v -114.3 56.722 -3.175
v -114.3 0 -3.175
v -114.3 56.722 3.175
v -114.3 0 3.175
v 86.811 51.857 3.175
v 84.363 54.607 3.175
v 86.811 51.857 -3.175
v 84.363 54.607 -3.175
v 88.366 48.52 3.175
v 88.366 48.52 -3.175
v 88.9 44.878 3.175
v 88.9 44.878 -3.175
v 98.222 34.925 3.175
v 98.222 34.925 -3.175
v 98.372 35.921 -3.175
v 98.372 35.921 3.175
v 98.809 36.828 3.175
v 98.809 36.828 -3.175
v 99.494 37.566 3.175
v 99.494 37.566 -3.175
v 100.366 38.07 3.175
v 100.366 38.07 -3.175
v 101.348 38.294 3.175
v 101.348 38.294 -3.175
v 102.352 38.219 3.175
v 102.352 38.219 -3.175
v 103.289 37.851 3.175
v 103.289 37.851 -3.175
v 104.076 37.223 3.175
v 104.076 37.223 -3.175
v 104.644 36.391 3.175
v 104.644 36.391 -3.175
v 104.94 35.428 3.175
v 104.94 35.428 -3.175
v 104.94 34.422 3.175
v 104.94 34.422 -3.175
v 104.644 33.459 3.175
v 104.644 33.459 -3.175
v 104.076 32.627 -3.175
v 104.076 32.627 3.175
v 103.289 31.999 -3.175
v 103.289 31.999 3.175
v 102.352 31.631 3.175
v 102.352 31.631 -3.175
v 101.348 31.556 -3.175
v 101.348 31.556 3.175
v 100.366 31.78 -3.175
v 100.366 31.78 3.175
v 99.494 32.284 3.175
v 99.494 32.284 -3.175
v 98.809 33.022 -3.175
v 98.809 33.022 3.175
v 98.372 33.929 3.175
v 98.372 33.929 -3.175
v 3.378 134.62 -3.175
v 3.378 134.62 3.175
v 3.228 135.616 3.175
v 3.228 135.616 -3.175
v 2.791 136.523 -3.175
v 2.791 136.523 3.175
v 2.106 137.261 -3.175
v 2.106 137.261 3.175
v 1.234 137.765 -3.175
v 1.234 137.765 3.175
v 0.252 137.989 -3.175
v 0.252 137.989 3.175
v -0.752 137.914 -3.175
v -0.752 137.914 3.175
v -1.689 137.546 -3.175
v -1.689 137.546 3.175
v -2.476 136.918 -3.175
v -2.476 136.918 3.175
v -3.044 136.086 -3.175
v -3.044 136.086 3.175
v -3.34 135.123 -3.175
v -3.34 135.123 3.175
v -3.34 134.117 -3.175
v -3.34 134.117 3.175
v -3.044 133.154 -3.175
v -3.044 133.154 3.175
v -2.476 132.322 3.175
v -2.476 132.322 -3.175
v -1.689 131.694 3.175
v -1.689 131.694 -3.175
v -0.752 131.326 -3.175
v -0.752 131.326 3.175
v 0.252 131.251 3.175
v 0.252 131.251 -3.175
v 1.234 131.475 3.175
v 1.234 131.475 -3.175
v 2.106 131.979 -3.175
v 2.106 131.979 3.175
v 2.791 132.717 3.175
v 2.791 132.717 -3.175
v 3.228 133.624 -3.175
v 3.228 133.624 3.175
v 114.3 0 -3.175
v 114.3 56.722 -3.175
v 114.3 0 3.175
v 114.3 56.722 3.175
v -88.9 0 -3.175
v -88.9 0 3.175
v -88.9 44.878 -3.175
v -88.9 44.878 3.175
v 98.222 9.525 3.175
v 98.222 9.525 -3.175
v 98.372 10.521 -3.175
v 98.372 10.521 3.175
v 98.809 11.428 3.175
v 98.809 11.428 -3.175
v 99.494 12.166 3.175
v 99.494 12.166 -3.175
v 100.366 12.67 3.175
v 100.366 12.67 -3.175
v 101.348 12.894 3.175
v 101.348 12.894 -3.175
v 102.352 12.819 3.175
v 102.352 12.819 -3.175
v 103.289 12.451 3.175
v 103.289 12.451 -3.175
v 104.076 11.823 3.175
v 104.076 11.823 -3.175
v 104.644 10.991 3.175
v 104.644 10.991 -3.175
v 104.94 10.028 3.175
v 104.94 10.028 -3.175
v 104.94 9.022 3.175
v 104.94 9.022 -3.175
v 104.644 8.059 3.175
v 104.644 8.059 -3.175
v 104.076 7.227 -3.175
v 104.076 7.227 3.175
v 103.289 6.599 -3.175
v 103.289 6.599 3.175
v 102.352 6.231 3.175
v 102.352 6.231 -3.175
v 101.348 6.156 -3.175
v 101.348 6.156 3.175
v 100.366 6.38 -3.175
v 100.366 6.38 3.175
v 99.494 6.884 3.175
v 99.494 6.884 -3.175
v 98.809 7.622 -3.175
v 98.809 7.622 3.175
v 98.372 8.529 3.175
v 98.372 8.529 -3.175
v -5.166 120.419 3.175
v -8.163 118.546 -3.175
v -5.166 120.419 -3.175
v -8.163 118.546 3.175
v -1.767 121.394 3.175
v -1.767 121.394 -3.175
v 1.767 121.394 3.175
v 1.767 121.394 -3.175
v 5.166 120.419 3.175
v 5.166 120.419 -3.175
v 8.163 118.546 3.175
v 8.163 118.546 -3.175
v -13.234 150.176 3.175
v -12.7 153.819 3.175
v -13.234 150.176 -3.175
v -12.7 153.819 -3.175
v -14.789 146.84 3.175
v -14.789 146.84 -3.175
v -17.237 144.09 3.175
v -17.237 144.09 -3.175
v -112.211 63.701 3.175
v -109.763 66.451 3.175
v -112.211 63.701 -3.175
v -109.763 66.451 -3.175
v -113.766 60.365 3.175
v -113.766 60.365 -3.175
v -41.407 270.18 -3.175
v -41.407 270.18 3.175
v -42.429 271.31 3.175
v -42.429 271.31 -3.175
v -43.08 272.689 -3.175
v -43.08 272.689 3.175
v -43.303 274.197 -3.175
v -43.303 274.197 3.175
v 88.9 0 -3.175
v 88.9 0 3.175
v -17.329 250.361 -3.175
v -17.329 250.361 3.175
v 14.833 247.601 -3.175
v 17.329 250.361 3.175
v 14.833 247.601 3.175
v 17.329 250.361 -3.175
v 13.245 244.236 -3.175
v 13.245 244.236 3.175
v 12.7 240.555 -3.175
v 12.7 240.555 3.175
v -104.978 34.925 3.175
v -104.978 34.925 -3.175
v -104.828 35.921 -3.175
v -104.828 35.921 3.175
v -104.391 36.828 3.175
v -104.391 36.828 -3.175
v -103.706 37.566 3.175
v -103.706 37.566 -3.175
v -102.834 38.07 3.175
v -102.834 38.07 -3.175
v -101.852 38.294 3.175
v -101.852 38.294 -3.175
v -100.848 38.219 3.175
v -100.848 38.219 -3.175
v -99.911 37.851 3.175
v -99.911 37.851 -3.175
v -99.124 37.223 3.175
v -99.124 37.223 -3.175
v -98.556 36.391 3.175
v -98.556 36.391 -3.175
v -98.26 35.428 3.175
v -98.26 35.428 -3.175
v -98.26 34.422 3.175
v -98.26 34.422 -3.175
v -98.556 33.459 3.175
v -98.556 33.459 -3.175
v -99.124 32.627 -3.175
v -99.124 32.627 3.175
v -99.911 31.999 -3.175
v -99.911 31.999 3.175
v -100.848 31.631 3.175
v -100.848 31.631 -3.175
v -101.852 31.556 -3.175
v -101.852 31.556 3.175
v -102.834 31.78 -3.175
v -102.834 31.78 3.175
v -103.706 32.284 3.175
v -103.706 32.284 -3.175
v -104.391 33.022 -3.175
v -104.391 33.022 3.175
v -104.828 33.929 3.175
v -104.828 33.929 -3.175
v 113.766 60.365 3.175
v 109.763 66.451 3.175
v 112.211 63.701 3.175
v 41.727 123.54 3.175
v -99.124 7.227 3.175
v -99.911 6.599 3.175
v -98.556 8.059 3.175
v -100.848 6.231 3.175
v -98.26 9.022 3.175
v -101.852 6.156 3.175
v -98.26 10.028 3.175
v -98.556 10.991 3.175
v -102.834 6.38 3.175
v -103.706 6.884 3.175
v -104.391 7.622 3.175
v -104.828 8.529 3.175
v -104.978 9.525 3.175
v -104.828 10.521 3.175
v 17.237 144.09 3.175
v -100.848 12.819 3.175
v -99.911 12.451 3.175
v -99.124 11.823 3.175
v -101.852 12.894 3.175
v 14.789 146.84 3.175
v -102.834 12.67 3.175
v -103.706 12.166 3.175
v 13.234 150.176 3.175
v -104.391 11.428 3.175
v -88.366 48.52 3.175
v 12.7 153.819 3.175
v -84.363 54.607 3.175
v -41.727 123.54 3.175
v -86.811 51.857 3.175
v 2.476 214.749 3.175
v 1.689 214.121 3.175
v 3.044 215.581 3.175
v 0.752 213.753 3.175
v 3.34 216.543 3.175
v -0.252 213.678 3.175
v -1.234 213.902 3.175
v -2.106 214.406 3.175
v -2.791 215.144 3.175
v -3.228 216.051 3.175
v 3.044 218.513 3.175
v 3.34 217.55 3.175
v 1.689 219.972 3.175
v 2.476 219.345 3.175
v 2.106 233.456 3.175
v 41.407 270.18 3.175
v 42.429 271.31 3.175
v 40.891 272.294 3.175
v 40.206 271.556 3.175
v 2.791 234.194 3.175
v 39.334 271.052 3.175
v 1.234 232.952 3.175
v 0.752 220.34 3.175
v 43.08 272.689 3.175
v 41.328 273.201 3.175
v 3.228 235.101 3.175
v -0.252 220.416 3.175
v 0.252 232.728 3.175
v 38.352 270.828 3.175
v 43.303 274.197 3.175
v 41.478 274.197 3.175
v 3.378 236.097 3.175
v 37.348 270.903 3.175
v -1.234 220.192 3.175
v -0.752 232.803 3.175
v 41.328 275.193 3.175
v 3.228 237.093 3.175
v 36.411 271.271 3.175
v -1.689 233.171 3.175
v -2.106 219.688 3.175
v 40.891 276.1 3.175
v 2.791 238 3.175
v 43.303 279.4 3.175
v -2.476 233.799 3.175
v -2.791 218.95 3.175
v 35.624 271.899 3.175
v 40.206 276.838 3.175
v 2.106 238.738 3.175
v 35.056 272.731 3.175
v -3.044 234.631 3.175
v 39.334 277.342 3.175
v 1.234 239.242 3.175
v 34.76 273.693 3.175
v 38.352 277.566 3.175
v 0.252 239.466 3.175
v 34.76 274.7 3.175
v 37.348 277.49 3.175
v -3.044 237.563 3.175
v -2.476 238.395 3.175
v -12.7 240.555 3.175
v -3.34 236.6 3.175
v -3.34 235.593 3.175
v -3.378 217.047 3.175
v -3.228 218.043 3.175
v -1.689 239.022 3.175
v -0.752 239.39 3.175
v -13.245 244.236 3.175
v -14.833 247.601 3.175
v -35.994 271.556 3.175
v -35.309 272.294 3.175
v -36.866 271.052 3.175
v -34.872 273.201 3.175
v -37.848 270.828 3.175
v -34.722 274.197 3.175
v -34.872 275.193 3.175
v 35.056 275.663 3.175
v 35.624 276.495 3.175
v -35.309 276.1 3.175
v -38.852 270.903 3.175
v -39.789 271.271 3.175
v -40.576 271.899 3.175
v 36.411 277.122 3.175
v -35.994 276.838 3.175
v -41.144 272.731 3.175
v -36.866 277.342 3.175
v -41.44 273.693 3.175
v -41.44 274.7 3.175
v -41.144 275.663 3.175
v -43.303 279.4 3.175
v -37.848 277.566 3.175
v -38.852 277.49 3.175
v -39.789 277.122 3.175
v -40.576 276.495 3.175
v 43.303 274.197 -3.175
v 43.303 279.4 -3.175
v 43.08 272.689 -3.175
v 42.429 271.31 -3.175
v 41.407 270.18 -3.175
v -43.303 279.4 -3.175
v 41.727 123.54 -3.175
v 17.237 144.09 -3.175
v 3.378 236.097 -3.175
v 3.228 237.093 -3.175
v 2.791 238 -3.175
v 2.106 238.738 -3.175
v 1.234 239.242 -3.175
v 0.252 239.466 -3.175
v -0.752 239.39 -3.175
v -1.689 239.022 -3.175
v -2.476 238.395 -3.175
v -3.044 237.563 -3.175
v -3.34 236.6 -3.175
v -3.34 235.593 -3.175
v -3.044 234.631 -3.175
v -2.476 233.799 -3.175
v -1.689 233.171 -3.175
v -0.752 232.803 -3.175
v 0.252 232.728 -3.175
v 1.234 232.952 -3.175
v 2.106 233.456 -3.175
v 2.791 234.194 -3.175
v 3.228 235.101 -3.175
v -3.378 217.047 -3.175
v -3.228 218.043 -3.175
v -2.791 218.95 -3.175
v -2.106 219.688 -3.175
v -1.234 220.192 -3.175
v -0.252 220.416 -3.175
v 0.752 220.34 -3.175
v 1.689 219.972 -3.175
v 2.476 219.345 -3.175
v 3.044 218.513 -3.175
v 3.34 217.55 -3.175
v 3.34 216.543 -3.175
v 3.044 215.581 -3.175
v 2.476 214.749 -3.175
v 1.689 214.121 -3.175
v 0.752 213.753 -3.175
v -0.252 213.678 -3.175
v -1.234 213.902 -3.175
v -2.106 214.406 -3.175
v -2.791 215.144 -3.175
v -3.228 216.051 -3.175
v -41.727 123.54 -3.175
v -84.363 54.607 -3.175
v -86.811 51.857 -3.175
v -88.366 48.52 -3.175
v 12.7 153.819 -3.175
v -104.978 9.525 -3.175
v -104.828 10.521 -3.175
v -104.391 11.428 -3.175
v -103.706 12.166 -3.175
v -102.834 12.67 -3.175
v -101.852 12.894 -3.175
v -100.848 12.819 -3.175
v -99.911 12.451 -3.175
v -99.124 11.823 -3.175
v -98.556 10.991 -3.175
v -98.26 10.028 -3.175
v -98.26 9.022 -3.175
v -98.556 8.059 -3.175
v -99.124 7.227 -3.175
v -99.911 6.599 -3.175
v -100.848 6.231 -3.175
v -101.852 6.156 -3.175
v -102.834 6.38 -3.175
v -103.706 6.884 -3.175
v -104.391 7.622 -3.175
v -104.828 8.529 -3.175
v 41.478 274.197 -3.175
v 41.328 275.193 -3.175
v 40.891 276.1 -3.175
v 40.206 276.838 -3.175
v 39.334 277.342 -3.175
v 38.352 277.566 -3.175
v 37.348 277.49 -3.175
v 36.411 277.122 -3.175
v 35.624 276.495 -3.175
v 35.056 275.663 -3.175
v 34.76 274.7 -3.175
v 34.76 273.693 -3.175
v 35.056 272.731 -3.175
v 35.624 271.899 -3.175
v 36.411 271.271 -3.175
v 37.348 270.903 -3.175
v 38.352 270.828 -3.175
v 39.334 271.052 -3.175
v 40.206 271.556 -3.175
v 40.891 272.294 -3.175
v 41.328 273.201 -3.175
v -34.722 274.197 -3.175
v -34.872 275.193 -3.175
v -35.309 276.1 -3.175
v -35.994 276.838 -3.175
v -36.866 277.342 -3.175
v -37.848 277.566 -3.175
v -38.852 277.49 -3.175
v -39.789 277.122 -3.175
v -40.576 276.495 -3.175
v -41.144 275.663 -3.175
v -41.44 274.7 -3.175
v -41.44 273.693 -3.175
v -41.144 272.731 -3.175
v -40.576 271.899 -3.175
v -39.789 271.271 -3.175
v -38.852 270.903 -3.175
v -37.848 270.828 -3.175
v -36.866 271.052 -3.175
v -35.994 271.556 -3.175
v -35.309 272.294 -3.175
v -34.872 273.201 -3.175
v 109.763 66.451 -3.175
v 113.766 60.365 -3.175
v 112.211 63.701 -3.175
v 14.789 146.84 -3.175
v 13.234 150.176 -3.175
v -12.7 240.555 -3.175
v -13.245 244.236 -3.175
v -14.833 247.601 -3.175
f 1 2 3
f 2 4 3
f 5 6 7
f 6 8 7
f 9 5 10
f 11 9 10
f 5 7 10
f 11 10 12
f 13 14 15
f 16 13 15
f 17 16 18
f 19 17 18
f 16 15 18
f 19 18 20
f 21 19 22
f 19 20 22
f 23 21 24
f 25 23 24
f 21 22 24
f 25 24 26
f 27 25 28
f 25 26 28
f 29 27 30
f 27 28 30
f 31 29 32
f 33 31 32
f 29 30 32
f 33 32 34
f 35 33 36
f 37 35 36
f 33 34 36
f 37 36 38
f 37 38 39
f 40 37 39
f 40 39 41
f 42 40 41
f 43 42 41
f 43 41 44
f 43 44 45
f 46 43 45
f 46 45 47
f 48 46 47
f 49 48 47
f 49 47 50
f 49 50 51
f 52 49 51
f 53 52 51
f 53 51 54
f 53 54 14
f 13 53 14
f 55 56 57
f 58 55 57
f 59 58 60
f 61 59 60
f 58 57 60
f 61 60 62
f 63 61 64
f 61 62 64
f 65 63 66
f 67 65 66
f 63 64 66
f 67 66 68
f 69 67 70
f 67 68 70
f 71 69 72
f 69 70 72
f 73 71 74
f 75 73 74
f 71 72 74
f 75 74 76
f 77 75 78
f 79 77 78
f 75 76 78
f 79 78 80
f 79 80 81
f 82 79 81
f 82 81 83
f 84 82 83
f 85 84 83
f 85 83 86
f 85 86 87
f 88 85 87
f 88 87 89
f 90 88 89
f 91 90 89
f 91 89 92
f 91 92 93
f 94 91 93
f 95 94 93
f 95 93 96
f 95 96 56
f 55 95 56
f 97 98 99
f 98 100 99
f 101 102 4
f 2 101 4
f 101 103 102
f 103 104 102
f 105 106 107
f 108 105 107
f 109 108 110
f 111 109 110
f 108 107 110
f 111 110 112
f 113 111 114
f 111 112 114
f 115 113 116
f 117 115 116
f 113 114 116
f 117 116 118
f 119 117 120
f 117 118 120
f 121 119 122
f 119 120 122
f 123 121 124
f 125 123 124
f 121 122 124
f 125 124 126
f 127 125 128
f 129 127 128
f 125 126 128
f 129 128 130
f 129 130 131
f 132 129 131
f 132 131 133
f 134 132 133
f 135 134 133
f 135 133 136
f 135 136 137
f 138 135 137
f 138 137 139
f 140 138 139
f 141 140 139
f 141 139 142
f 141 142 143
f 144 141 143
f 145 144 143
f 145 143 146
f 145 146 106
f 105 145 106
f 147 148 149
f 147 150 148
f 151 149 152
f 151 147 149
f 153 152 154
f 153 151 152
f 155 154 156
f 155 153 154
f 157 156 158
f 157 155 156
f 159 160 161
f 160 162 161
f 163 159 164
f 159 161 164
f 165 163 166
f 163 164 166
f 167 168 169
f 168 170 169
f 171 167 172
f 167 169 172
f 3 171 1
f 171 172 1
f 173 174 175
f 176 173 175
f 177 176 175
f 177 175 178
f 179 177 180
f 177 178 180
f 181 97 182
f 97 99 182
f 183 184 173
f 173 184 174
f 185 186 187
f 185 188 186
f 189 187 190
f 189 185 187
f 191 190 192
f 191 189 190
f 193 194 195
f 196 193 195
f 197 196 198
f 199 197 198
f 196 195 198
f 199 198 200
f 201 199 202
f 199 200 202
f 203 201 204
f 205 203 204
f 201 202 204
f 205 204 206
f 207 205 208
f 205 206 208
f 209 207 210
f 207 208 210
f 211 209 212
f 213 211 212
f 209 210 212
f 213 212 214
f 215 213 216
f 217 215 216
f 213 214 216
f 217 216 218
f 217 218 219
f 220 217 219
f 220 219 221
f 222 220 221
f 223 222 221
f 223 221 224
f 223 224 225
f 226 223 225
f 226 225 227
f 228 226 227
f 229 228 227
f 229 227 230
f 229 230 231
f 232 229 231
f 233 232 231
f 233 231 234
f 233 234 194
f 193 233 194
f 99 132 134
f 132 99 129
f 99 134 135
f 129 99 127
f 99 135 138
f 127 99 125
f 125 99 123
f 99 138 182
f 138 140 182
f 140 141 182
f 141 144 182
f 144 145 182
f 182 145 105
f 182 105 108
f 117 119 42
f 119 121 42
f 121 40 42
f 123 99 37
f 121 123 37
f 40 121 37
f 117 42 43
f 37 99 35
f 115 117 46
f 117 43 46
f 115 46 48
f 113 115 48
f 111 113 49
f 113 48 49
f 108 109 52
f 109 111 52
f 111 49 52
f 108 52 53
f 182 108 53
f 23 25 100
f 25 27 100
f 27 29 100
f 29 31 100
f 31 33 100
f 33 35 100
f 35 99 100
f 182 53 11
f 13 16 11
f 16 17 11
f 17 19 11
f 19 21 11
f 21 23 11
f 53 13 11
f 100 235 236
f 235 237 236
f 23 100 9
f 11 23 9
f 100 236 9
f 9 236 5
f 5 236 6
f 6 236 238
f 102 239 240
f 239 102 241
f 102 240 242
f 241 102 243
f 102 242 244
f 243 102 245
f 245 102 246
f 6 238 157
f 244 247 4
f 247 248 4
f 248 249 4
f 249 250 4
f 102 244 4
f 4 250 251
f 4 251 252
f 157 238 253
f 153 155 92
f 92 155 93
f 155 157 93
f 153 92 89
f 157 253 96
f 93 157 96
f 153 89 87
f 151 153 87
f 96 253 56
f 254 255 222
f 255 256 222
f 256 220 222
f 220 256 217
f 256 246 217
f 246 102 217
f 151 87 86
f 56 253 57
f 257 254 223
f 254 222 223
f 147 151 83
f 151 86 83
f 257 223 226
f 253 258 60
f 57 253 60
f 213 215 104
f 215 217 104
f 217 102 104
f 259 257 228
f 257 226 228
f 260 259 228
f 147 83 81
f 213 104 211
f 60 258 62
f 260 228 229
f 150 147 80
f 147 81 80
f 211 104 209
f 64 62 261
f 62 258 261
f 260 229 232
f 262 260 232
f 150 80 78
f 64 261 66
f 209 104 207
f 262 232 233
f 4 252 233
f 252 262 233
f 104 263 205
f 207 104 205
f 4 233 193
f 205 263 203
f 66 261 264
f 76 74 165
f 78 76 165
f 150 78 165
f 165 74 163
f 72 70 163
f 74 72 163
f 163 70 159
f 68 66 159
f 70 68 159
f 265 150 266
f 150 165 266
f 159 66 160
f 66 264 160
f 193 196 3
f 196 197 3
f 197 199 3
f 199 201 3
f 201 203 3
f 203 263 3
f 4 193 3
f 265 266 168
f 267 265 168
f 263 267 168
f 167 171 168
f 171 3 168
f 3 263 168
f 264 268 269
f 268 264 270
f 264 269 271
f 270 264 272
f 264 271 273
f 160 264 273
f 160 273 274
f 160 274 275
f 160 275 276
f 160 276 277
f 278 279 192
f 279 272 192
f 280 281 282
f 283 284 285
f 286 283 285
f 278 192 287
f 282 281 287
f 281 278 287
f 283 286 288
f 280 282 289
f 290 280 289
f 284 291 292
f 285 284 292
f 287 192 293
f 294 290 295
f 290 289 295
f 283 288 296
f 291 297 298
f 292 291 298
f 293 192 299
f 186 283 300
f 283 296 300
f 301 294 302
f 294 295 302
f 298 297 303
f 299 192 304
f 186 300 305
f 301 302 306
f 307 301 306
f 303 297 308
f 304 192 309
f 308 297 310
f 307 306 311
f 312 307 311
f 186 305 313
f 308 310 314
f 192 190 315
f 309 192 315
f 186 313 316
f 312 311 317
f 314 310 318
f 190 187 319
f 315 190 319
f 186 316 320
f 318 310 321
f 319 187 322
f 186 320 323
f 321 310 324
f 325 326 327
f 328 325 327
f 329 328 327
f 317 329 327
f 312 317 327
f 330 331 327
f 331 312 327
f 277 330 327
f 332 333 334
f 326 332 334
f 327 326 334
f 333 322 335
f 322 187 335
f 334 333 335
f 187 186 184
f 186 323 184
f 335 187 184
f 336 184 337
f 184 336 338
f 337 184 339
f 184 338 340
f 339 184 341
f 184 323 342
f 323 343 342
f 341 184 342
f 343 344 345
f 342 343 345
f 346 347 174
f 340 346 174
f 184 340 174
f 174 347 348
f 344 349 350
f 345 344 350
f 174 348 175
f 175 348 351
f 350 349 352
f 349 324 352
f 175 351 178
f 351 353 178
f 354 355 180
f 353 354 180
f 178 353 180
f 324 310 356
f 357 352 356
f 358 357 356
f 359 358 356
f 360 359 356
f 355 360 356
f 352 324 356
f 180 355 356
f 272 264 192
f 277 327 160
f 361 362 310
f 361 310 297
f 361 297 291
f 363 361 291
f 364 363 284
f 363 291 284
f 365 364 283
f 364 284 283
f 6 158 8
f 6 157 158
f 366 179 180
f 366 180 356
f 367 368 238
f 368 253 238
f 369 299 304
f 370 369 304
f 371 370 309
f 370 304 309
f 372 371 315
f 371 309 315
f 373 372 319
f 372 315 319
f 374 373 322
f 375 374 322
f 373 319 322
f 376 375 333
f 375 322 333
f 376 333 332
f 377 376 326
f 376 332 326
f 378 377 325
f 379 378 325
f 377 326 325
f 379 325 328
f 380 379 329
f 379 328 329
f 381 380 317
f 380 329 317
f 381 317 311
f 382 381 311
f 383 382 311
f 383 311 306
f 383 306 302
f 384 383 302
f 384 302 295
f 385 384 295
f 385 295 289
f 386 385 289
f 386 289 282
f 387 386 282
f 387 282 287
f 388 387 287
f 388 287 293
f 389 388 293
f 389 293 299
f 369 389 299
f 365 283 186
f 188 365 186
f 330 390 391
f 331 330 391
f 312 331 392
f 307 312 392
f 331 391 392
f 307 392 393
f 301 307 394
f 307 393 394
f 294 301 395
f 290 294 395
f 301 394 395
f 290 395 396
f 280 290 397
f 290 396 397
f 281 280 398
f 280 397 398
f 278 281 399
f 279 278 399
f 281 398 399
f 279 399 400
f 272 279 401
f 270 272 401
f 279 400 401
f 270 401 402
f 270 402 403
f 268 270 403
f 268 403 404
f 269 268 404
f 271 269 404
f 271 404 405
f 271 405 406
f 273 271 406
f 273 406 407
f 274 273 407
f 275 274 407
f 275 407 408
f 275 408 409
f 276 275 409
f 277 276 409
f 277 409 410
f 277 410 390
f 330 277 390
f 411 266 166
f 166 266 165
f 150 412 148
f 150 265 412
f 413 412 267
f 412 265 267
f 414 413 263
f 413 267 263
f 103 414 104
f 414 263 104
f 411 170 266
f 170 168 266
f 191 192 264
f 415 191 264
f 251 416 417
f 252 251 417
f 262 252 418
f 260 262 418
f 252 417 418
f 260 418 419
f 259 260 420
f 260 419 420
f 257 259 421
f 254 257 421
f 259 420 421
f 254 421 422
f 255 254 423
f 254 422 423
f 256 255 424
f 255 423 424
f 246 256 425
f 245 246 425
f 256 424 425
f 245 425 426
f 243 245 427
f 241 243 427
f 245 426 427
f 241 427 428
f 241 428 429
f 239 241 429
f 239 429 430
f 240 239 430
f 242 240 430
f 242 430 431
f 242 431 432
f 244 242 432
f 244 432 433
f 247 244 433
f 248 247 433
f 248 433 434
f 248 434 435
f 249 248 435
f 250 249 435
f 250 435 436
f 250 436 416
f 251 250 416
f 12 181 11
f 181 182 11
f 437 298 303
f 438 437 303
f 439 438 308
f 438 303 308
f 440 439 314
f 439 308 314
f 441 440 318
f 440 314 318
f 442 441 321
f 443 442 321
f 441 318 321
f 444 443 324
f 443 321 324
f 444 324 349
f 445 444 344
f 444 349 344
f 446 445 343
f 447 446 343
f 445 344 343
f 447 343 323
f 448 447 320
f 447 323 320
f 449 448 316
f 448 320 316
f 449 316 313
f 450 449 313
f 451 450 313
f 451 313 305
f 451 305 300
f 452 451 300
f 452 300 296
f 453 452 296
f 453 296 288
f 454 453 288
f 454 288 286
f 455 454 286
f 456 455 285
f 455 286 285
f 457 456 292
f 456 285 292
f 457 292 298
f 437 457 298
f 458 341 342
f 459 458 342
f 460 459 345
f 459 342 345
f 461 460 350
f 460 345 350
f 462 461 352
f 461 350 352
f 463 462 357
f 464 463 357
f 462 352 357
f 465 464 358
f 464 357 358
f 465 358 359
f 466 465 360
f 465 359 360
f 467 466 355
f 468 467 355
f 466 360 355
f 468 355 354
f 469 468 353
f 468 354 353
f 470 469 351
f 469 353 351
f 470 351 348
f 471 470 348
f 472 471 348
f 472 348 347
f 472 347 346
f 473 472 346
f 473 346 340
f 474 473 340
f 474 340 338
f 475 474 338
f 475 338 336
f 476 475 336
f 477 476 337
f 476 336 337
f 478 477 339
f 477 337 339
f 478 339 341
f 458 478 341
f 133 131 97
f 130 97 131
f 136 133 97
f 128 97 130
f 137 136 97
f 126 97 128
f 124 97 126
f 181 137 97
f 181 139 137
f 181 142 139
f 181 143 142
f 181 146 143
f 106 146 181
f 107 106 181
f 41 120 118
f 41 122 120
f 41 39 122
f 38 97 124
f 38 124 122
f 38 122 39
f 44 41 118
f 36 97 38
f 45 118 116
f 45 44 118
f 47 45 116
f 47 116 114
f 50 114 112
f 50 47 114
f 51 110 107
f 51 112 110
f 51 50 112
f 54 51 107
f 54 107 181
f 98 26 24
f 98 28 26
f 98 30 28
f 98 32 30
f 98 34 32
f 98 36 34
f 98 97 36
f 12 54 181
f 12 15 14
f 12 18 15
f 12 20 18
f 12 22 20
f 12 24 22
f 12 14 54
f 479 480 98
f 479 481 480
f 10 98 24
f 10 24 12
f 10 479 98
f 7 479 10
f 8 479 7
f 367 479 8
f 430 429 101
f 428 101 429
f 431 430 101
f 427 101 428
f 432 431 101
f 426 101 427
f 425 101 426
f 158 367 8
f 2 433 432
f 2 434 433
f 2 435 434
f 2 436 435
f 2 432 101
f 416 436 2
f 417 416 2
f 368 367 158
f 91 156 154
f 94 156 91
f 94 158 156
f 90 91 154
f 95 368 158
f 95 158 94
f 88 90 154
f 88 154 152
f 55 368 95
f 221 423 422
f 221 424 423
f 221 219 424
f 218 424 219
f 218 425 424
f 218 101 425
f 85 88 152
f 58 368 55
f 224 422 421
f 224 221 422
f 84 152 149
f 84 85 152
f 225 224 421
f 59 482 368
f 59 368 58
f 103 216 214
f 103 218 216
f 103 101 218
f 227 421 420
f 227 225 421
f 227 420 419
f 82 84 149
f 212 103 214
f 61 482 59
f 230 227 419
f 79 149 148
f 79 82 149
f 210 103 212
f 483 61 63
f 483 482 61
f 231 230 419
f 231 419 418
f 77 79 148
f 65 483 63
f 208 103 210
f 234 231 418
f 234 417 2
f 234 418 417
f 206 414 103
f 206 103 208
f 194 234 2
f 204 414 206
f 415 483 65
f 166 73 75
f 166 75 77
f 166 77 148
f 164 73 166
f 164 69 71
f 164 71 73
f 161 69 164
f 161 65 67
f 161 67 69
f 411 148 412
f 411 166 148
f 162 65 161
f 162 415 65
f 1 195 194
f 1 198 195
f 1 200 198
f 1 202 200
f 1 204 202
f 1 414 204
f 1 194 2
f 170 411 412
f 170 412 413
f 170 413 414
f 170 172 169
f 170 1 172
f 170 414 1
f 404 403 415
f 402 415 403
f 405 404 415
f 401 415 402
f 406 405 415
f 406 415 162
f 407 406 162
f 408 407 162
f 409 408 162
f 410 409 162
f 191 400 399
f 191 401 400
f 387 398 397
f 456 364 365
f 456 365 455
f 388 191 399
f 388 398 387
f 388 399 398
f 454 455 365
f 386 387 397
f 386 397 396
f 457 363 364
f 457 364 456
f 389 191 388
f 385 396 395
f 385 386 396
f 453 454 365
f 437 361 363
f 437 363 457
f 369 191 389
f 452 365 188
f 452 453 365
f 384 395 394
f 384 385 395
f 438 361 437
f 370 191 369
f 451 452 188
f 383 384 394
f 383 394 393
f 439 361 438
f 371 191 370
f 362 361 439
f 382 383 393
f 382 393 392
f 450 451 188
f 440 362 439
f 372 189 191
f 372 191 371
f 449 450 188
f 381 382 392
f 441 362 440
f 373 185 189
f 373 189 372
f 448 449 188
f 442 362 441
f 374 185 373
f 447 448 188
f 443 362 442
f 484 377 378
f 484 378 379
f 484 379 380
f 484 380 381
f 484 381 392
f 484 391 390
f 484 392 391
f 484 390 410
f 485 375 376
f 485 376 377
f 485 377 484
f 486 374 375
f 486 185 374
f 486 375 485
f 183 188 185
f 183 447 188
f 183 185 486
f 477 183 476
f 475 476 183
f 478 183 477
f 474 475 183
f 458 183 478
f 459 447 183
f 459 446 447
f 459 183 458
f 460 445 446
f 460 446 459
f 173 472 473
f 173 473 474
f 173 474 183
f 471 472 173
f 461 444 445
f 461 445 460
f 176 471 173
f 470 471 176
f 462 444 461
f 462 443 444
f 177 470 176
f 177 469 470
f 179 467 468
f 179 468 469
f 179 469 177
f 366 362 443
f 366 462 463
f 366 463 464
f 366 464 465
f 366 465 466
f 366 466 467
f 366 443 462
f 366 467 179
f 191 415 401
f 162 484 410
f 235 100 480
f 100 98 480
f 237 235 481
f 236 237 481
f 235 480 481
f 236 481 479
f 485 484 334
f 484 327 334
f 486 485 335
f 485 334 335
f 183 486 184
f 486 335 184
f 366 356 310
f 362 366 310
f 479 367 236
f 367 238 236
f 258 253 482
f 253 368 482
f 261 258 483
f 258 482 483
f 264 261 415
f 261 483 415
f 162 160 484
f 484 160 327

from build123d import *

# Parameters (mm, degrees)
BOSS_EXTRUDE1_DEPTH     = 3.175
FILLET1_R               = 12.7
F_1_4_CLEARANCE_HOLE1_D = 6.7564
F_1_4_CLEARANCE_HOLE3_D = 6.7564
F_1_4_CLEARANCE_HOLE4_D = 6.7564
SKETCH11_R              = 3.3782
BOSS_EXTRUDE2_DEPTH     = 6.35
FILLET2_R               = 12.7
SKETCH12_R              = 3.3782
CUT_EXTRUDE1_DEPTH      = 302.94233307


with BuildPart() as part:
    # Sketch1 → Boss-Extrude1 (new, symmetric)
    with BuildSketch(Plane.XY):
        Polygon((-88.9, 0), (-114.3, 0), (-114.3, 62.644214517), (-41.726805286, 123.540355435), (-12.7, 147.896737045), (-12.7, 279.4), (12.7, 279.4), (12.7, 147.896737045), (41.726805286, 123.540355435), (114.3, 62.644214517), (114.3, 0), (88.9, 0), (88.9, 50.8), (25.4, 104.08282658), (0, 125.395957212), (-25.4, 104.08282658), (-88.9, 50.8), align=None)
    extrude(amount=BOSS_EXTRUDE1_DEPTH, both=True)

    # Fillet1
    fillet1_edges = [part.edges().sort_by_distance(p)[0] for p in [
        (-114.3, 62.644214517, 0),
        (-12.7, 147.896737045, 0),
        (12.7, 147.896737045, 0),
        (114.3, 62.644214517, 0),
        (88.9, 50.8, 0),
        (0, 125.395957212, 0),
        (-88.9, 50.8, 0),
    ]]
    fillet(fillet1_edges, radius=FILLET1_R)

    # 1/4 Clearance Hole1 (through all)
    with Locations(Plane.XY.offset(3.175)):
        with Locations((101.6, 34.925), (-101.6, 9.525), (-101.6, 34.925), (101.6, 9.525)):
            Hole(F_1_4_CLEARANCE_HOLE1_D / 2)

    # 1/4 Clearance Hole3 (through all)
    with Locations(Plane(origin=(0, 0, -3.175), x_dir=(-1, 0, 0), z_dir=(0, 0, -1))):
        with Locations((0, 134.62)):
            Hole(F_1_4_CLEARANCE_HOLE3_D / 2)

    # 1/4 Clearance Hole4 (through all)
    with Locations(Plane.XY.offset(3.175)):
        with Locations((0, 217.046839415)):
            Hole(F_1_4_CLEARANCE_HOLE4_D / 2)

    # Sketch11 → Boss-Extrude2 (add)
    with BuildSketch(Plane.XY.offset(3.175)):
        with BuildLine():
            Line((-43.303160585, 279.4), (43.303160585, 279.4))
            Line((43.303160585, 279.4), (43.303160585, 274.196839415))
            ThreePointArc((43.303160585, 274.196839415), (42.805221287, 271.975629672), (41.406708366, 270.179556768))
            Line((41.406708366, 270.179556768), (2.60825781, 238.24375032))
            ThreePointArc((2.60825781, 238.24375032), (0, 239.475039415), (-2.60825781, 238.24375032))
            Line((-2.60825781, 238.24375032), (-41.406708366, 270.179556768))
            ThreePointArc((-41.406708366, 270.179556768), (-42.805221287, 271.975629672), (-43.303160585, 274.196839415))
            Line((-43.303160585, 274.196839415), (-43.303160585, 279.4))
        make_face()
        with Locations((-38.1, 274.196839415)):
            Circle(SKETCH11_R, mode=Mode.SUBTRACT)
        with Locations((38.1, 274.196839415)):
            Circle(SKETCH11_R, mode=Mode.SUBTRACT)
    extrude(amount=-BOSS_EXTRUDE2_DEPTH)

    # Fillet2
    fillet2_edges = [part.edges().sort_by_distance(p)[0] for p in [
        (12.7, 246.550471869, 0),
        (-12.7, 246.550471869, 0),
    ]]
    fillet(fillet2_edges, radius=FILLET2_R)

    # Sketch12 → Cut-Extrude1 (cut, through all)
    with BuildSketch(Plane.XY.offset(3.175)):
        with Locations((0, 236.096839415)):
            Circle(SKETCH12_R)
    extrude(amount=-CUT_EXTRUDE1_DEPTH, mode=Mode.SUBTRACT)


solid = part.part
